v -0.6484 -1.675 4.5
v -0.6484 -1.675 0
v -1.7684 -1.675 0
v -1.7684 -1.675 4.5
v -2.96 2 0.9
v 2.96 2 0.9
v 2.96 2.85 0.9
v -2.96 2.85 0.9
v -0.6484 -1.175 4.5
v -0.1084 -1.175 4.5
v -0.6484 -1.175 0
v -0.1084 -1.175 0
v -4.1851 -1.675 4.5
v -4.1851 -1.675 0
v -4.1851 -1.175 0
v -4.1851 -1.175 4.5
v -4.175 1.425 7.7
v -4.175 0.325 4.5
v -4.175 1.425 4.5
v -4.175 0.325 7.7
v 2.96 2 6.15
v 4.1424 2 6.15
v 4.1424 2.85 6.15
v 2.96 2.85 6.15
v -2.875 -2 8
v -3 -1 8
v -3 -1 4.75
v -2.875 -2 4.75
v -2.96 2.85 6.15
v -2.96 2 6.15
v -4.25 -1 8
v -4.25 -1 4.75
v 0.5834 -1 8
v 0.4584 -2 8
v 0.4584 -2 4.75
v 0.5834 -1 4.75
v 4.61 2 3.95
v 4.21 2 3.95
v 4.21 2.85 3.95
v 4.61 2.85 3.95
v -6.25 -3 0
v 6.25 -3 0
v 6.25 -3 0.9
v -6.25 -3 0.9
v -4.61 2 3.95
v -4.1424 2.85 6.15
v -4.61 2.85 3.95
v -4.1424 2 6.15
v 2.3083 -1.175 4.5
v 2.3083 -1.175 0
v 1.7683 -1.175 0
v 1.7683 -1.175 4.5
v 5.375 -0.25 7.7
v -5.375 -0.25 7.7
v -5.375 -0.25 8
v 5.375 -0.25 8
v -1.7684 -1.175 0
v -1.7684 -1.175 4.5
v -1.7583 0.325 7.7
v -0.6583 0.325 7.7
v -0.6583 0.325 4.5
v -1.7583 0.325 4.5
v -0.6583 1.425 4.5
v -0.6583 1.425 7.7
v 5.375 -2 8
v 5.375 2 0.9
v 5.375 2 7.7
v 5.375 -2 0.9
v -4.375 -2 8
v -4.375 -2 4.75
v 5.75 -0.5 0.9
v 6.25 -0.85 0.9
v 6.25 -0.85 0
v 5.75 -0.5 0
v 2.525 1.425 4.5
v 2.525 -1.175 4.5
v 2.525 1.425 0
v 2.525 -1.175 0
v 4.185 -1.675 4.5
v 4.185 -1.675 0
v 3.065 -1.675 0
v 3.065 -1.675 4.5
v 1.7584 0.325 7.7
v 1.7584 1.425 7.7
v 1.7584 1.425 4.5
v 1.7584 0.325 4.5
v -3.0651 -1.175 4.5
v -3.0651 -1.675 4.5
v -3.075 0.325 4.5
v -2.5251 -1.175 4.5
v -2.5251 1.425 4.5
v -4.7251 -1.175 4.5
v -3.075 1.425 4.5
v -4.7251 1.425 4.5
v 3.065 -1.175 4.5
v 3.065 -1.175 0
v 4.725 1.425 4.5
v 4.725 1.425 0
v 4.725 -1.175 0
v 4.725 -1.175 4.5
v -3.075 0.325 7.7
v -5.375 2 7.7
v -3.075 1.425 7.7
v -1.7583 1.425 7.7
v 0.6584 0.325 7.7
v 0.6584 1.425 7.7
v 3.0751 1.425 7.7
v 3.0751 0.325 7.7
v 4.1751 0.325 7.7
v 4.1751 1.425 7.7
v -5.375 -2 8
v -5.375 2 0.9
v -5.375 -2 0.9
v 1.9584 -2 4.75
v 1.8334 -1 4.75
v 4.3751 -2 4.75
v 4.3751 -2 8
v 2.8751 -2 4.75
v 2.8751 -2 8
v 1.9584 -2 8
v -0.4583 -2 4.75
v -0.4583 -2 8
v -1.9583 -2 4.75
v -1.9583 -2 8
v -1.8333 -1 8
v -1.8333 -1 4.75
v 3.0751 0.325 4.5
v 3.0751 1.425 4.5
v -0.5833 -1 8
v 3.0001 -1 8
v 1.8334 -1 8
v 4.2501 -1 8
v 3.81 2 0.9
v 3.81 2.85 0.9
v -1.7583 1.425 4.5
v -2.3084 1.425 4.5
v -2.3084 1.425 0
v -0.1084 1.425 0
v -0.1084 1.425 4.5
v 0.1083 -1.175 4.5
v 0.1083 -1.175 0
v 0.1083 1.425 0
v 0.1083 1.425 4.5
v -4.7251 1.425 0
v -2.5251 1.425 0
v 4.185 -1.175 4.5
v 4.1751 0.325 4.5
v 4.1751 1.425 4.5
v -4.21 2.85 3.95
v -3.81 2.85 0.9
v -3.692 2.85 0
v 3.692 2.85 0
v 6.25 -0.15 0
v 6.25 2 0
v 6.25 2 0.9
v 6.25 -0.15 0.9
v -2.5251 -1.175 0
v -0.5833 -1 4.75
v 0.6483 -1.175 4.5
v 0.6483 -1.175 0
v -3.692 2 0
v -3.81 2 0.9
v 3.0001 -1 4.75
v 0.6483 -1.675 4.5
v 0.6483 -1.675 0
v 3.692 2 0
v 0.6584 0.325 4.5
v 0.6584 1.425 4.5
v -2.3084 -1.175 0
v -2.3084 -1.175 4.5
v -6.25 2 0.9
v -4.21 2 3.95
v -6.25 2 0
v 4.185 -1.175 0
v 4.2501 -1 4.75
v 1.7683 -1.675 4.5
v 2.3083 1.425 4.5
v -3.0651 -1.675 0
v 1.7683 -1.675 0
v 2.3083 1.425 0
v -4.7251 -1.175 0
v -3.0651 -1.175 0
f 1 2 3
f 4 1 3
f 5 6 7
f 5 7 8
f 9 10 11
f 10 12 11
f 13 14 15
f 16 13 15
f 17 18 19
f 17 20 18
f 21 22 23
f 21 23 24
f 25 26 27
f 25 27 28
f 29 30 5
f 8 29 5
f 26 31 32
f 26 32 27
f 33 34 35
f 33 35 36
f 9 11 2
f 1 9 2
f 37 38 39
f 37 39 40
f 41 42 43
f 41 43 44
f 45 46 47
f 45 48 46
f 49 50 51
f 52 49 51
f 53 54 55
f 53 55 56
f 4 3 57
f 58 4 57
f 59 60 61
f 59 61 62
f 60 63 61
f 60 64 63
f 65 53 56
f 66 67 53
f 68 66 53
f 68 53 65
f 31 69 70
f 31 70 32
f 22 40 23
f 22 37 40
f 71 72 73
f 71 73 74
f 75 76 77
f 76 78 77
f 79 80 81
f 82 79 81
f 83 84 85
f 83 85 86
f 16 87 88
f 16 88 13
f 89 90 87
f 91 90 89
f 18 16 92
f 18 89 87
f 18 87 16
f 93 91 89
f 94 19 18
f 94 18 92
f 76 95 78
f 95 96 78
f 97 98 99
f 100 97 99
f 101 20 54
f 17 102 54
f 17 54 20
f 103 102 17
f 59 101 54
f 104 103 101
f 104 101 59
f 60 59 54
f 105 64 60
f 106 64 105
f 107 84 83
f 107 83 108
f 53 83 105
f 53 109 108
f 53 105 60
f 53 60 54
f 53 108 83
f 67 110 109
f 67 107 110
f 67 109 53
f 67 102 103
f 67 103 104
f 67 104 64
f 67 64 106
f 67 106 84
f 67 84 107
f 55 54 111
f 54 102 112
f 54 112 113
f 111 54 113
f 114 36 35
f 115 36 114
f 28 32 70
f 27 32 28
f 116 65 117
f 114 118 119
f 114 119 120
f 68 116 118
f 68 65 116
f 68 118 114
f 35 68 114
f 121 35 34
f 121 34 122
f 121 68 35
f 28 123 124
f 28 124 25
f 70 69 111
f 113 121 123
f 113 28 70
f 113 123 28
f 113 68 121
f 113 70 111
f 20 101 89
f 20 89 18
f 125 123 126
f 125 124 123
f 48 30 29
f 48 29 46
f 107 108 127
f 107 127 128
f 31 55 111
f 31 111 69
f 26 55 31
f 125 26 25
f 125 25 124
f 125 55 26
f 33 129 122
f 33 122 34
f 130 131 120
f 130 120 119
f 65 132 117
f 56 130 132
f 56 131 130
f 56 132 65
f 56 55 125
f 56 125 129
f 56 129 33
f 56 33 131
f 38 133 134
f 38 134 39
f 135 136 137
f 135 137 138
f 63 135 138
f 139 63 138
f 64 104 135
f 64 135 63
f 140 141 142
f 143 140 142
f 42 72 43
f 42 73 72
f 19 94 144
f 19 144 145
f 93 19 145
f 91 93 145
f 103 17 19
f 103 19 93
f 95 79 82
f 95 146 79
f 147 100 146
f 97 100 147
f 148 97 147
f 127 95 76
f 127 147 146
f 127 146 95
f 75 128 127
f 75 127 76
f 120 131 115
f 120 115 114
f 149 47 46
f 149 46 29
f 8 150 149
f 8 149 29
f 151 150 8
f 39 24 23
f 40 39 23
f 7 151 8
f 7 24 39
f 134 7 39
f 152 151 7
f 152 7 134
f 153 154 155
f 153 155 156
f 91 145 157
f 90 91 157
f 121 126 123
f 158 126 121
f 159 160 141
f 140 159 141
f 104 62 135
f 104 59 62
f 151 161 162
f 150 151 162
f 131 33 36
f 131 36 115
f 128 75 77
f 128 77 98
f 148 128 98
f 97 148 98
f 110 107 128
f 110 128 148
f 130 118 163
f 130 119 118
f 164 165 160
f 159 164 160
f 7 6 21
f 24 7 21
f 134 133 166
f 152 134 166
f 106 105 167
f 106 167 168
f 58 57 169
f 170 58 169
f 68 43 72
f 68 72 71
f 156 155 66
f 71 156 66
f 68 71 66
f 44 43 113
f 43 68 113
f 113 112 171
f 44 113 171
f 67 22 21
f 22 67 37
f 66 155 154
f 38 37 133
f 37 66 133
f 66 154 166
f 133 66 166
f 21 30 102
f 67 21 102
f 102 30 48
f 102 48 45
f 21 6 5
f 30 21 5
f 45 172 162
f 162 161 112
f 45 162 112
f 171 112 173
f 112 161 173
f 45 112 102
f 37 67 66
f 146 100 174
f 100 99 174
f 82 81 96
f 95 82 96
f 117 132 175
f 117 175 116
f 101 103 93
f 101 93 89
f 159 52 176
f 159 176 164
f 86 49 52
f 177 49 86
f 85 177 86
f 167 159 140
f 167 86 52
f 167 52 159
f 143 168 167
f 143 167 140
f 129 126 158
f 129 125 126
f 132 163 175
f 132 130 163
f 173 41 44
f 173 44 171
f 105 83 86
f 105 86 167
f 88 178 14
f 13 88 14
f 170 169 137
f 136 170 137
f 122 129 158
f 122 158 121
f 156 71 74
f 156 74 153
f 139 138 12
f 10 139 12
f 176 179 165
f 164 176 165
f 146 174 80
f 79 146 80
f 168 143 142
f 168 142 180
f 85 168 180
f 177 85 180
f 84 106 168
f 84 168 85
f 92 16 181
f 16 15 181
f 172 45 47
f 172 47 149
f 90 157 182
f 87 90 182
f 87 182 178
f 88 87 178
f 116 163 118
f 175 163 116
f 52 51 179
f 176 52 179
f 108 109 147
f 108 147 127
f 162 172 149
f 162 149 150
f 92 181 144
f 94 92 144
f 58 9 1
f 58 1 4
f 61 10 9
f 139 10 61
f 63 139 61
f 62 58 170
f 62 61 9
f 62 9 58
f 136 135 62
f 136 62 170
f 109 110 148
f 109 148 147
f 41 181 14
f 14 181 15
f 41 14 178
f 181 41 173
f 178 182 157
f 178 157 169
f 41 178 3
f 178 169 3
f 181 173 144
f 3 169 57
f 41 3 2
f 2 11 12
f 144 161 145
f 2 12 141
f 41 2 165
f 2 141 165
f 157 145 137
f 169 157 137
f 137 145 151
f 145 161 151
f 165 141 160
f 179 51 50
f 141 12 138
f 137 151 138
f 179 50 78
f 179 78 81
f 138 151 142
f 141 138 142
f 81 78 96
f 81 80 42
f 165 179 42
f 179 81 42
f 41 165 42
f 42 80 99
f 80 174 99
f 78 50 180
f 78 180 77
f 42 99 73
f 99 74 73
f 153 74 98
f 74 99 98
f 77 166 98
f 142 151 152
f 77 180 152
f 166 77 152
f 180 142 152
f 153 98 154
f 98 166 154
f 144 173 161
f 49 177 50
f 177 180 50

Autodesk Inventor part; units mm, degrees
ref_plane "YZ Plane" through (0, 0, 0) normal (1, 0, 0) x (0, 1, 0)
ref_plane "XZ Plane" through (0, 0, 0) normal (0, 1, 0) x (-1, 0, 0)
ref_plane "XY Plane" through (0, 0, 0) normal (0, 0, 1) x (1, 0, 0)
sketch "Sketch1" plane through (0, 0, 0) normal (0, 0, 1) x (1, 0, 0)
  line L0 (-5.375, -2) -> (5.375, -2)
  line L1 (5.375, -2) -> (5.375, 2)
  line L2 (5.375, 2) -> (-5.375, 2)
  line L3 (-5.375, 2) -> (-5.375, -2)
  line L4 (-5.375, -2) -> (5.375, 2) construction
  line L5 (5.375, -2) -> (-5.375, 2) construction
  point P0 (0, 0)
  dimension "d0" = 10.75
  dimension "d1" = 4
extrude "Extrusion1" add sketch "Sketch1" along normal blind 7.7
sketch "Sketch2" plane through (0, 0, 0) normal (0, 0, -1) x (-1, 0, 0)
  line L0 (5.375, -2) -> (-5.375, -2) projected
  line L1 (5.375, 2) -> (5.375, -2) projected
  line L2 (-5.375, 2) -> (5.375, 2) projected
  line L3 (-5.375, -2) -> (-5.375, 2) projected
  line L4 (6.25, 2) -> (-6.25, 2)
  line L5 (-6.25, 2) -> (-6.25, -3)
  line L6 (-6.25, -3) -> (6.25, -3)
  line L7 (6.25, -3) -> (6.25, 2)
  point P0 (0, 0)
  dimension "d4" = 0.875
  dimension "d6" = 0.875
  dimension "d7" = 1
extrude "Extrusion2" add sketch "Sketch2" against normal blind 0.9 contours L1 L4 L7 L6 L5 L3 L0
sketch "Sketch3" plane through (0, 0, 7.7) normal (0, 0, 1) x (1, 0, 0)
  line L0 (-5.375, 2) -> (-5.375, -2) projected
  line L1 (5.375, -2) -> (-5.375, -2)
  line L2 (-5.375, -2) -> (-5.375, -0.25)
  line L3 (-5.375, -0.25) -> (5.375, -0.25)
  line L4 (5.375, -0.25) -> (5.375, -2)
  point P0 (0, 0)
  dimension "d10" = 1.75
extrude "Extrusion3" add sketch "Sketch3" along normal blind 0.3
sketch "Sketch4" plane through (0, 0, 8) normal (0, 0, 1) x (1, 0, 0)
  line L0 (-5.375, -2) -> (5.375, -2) projected
  line L1 (-4.375, -2) -> (-4.25, -1)
  line L2 (-4.25, -1) -> (-3, -1)
  line L3 (-3, -1) -> (-2.875, -2)
  point P0 (0, 0)
  dimension "d13" = 1
  dimension "d14" = 1
  dimension "d15" = 1.5
  dimension "d16" = 1.25
extrude "Extrusion4" cut sketch "Sketch4" against normal blind 3.25
pattern_linear "Rectangular Pattern1" count 4 spacing 2.4167 along (1, 0, 0) of "Extrusion4"
sketch "Sketch5" plane through (0, 0, 7.7) normal (0, 0, 1) x (1, 0, 0)
  line L0 (-5.375, 2) -> (-5.375, -0.25) projected
  line L1 (-3.075, 0.325) -> (-4.175, 0.325)
  line L2 (-4.175, 0.325) -> (-4.175, 1.425)
  line L3 (-4.175, 1.425) -> (-3.075, 1.425)
  line L4 (-3.075, 1.425) -> (-3.075, 0.325)
  line L5 (-3.075, 0.325) -> (-4.175, 1.425) construction
  line L6 (-4.175, 0.325) -> (-3.075, 1.425) construction
  line L7 (-4.25, -1) -> (-3, -1) projected
  point P0 (0, 0)
  point P1 (-3.625, 0.875)
  point P2 (-3.625, 0.875)
  point P3 (-5.375, 0.875)
  point P4 (-3.625, -1)
  point P5 (-3.625, 0.875)
  dimension "d23" = 1.1
extrude "Extrusion5" cut sketch "Sketch5" against normal through all
pattern_linear "Rectangular Pattern2" count 4 spacing 2.4167 along (1, 0, 0) of "Extrusion5"
sketch "Sketch6" plane through (0, 0, 0) normal (0, 0, -1) x (-1, 0, 0)
  line L0 (-2.525, -1.175) -> (-2.525, 1.425)
  line L1 (-2.525, 1.425) -> (-4.725, 1.425)
  line L2 (-4.725, 1.425) -> (-4.725, -1.175)
  line L3 (-4.185, -1.175) -> (-4.185, -1.675)
  line L4 (-4.185, -1.675) -> (-3.065, -1.675)
  line L5 (-3.065, -1.675) -> (-3.065, -1.175)
  line L6 (-4.725, -1.175) -> (-4.185, -1.175)
  line L7 (-3.065, -1.175) -> (-2.525, -1.175)
  line L8 (-4.375, -2) -> (-2.875, -2) projected
  line L9 (-4.25, -1) -> (-4.375, -2) projected
  line L10 (-3, -1) -> (-4.25, -1) projected
  line L11 (-2.875, -2) -> (-3, -1) projected
  line L12 (-1.9583, -2) -> (-0.4583, -2) projected
  line L13 (-1.8333, -1) -> (-1.9583, -2) projected
  line L14 (-0.5833, -1) -> (-1.8333, -1) projected
  line L15 (-0.4583, -2) -> (-0.5833, -1) projected
  point P0 (-3.625, 1.425)
  point P1 (-3.625, -1.675)
  point P2 (-3.625, -1)
  point P3 (-1.2083, -1)
  point P4 (-4.175, 1.425)
  dimension "d31" = 2.2
  dimension "d34" = 1.12
  dimension "d37" = 0.5
  dimension "d38" = 2.6
  dimension "d56" = 2.4167
sketch "Sketch7" plane through (-5.375, 2, 7.7) normal (0, 1, 0) x (1, 0, 0)
  line L0 (-0.875, 7.7) -> (11.625, 7.7) projected
  line L1 (10.75, 0) -> (0, 0) projected
  line L2 (10.75, 6.8) -> (10.75, 0) projected
  line L3 (8.335, 6.8) -> (9.185, 6.8)
  line L4 (8.335, 3.75) -> (9.985, 3.75)
  line L5 (9.985, 3.75) -> (9.5174, 1.55)
  line L6 (9.5174, 1.55) -> (8.335, 1.55)
  line L7 (8.335, 6.8) -> (8.335, 1.55)
  line L8 (9.185, 6.8) -> (9.585, 3.75)
  line L9 (5.375, 7.7) -> (5.375, 0)
  line L10 (9.185, 6.8) -> (9.067, 7.7)
  line L11 (5.375, 7.7) -> (9.067, 7.7)
  line L12 (8.335, 6.8) -> (5.375, 6.8)
  point P0 (5.375, 7.7)
  dimension "d41" = 0.85
  dimension "d45" = 1.25
  dimension "d46" = 6.15
  dimension "d48" = 2.2
  dimension "d49" = 12
  dimension "d50" = 0.4
  dimension "d52" = 5.92
  dimension "d53" = 0.9
extrude "Extrusion6" add sketch "Sketch7" along normal blind 0.85
mirror "Mirror1" about plane through (0, 0, 0) normal (1, 0, 0) of "Extrusion6"
extrude "Extrusion7" cut sketch "Sketch6" against normal blind 4.5 contours L7 L11 L10 L9 L6 L2 L1 L0 | L7 L5 L4 L3 L6 L9 L10 L11
pattern_linear "Rectangular Pattern3" count 4 spacing 2.4167 along (-1, 0, 0) of "Extrusion7"
sketch "Sketch8" plane through (0, 0, 0.9) normal (0, 0, 1) x (1, 0, 0)
  line L0 (6.25, -3) -> (6.25, 2) projected
  line L1 (6.25, -0.85) -> (6.25, -0.15)
  line L2 (6.25, -0.85) -> (5.75, -0.5)
  line L3 (5.75, -0.5) -> (6.25, -0.15)
  point P0 (0, 0)
  point P1 (6.25, -0.5)
  point P2 (6.25, -0.5)
  dimension "d63" = 0.7
  dimension "d64" = 0.5
extrude "Extrusion8" cut sketch "Sketch8" against normal through all
equation "\"d29\" = d21"
equation "\"d61\" = d21"
equation "\"d21\" = 2.416667"
properties part number "3S Female JST XH 4 Pin" material "PBT Plastic"
